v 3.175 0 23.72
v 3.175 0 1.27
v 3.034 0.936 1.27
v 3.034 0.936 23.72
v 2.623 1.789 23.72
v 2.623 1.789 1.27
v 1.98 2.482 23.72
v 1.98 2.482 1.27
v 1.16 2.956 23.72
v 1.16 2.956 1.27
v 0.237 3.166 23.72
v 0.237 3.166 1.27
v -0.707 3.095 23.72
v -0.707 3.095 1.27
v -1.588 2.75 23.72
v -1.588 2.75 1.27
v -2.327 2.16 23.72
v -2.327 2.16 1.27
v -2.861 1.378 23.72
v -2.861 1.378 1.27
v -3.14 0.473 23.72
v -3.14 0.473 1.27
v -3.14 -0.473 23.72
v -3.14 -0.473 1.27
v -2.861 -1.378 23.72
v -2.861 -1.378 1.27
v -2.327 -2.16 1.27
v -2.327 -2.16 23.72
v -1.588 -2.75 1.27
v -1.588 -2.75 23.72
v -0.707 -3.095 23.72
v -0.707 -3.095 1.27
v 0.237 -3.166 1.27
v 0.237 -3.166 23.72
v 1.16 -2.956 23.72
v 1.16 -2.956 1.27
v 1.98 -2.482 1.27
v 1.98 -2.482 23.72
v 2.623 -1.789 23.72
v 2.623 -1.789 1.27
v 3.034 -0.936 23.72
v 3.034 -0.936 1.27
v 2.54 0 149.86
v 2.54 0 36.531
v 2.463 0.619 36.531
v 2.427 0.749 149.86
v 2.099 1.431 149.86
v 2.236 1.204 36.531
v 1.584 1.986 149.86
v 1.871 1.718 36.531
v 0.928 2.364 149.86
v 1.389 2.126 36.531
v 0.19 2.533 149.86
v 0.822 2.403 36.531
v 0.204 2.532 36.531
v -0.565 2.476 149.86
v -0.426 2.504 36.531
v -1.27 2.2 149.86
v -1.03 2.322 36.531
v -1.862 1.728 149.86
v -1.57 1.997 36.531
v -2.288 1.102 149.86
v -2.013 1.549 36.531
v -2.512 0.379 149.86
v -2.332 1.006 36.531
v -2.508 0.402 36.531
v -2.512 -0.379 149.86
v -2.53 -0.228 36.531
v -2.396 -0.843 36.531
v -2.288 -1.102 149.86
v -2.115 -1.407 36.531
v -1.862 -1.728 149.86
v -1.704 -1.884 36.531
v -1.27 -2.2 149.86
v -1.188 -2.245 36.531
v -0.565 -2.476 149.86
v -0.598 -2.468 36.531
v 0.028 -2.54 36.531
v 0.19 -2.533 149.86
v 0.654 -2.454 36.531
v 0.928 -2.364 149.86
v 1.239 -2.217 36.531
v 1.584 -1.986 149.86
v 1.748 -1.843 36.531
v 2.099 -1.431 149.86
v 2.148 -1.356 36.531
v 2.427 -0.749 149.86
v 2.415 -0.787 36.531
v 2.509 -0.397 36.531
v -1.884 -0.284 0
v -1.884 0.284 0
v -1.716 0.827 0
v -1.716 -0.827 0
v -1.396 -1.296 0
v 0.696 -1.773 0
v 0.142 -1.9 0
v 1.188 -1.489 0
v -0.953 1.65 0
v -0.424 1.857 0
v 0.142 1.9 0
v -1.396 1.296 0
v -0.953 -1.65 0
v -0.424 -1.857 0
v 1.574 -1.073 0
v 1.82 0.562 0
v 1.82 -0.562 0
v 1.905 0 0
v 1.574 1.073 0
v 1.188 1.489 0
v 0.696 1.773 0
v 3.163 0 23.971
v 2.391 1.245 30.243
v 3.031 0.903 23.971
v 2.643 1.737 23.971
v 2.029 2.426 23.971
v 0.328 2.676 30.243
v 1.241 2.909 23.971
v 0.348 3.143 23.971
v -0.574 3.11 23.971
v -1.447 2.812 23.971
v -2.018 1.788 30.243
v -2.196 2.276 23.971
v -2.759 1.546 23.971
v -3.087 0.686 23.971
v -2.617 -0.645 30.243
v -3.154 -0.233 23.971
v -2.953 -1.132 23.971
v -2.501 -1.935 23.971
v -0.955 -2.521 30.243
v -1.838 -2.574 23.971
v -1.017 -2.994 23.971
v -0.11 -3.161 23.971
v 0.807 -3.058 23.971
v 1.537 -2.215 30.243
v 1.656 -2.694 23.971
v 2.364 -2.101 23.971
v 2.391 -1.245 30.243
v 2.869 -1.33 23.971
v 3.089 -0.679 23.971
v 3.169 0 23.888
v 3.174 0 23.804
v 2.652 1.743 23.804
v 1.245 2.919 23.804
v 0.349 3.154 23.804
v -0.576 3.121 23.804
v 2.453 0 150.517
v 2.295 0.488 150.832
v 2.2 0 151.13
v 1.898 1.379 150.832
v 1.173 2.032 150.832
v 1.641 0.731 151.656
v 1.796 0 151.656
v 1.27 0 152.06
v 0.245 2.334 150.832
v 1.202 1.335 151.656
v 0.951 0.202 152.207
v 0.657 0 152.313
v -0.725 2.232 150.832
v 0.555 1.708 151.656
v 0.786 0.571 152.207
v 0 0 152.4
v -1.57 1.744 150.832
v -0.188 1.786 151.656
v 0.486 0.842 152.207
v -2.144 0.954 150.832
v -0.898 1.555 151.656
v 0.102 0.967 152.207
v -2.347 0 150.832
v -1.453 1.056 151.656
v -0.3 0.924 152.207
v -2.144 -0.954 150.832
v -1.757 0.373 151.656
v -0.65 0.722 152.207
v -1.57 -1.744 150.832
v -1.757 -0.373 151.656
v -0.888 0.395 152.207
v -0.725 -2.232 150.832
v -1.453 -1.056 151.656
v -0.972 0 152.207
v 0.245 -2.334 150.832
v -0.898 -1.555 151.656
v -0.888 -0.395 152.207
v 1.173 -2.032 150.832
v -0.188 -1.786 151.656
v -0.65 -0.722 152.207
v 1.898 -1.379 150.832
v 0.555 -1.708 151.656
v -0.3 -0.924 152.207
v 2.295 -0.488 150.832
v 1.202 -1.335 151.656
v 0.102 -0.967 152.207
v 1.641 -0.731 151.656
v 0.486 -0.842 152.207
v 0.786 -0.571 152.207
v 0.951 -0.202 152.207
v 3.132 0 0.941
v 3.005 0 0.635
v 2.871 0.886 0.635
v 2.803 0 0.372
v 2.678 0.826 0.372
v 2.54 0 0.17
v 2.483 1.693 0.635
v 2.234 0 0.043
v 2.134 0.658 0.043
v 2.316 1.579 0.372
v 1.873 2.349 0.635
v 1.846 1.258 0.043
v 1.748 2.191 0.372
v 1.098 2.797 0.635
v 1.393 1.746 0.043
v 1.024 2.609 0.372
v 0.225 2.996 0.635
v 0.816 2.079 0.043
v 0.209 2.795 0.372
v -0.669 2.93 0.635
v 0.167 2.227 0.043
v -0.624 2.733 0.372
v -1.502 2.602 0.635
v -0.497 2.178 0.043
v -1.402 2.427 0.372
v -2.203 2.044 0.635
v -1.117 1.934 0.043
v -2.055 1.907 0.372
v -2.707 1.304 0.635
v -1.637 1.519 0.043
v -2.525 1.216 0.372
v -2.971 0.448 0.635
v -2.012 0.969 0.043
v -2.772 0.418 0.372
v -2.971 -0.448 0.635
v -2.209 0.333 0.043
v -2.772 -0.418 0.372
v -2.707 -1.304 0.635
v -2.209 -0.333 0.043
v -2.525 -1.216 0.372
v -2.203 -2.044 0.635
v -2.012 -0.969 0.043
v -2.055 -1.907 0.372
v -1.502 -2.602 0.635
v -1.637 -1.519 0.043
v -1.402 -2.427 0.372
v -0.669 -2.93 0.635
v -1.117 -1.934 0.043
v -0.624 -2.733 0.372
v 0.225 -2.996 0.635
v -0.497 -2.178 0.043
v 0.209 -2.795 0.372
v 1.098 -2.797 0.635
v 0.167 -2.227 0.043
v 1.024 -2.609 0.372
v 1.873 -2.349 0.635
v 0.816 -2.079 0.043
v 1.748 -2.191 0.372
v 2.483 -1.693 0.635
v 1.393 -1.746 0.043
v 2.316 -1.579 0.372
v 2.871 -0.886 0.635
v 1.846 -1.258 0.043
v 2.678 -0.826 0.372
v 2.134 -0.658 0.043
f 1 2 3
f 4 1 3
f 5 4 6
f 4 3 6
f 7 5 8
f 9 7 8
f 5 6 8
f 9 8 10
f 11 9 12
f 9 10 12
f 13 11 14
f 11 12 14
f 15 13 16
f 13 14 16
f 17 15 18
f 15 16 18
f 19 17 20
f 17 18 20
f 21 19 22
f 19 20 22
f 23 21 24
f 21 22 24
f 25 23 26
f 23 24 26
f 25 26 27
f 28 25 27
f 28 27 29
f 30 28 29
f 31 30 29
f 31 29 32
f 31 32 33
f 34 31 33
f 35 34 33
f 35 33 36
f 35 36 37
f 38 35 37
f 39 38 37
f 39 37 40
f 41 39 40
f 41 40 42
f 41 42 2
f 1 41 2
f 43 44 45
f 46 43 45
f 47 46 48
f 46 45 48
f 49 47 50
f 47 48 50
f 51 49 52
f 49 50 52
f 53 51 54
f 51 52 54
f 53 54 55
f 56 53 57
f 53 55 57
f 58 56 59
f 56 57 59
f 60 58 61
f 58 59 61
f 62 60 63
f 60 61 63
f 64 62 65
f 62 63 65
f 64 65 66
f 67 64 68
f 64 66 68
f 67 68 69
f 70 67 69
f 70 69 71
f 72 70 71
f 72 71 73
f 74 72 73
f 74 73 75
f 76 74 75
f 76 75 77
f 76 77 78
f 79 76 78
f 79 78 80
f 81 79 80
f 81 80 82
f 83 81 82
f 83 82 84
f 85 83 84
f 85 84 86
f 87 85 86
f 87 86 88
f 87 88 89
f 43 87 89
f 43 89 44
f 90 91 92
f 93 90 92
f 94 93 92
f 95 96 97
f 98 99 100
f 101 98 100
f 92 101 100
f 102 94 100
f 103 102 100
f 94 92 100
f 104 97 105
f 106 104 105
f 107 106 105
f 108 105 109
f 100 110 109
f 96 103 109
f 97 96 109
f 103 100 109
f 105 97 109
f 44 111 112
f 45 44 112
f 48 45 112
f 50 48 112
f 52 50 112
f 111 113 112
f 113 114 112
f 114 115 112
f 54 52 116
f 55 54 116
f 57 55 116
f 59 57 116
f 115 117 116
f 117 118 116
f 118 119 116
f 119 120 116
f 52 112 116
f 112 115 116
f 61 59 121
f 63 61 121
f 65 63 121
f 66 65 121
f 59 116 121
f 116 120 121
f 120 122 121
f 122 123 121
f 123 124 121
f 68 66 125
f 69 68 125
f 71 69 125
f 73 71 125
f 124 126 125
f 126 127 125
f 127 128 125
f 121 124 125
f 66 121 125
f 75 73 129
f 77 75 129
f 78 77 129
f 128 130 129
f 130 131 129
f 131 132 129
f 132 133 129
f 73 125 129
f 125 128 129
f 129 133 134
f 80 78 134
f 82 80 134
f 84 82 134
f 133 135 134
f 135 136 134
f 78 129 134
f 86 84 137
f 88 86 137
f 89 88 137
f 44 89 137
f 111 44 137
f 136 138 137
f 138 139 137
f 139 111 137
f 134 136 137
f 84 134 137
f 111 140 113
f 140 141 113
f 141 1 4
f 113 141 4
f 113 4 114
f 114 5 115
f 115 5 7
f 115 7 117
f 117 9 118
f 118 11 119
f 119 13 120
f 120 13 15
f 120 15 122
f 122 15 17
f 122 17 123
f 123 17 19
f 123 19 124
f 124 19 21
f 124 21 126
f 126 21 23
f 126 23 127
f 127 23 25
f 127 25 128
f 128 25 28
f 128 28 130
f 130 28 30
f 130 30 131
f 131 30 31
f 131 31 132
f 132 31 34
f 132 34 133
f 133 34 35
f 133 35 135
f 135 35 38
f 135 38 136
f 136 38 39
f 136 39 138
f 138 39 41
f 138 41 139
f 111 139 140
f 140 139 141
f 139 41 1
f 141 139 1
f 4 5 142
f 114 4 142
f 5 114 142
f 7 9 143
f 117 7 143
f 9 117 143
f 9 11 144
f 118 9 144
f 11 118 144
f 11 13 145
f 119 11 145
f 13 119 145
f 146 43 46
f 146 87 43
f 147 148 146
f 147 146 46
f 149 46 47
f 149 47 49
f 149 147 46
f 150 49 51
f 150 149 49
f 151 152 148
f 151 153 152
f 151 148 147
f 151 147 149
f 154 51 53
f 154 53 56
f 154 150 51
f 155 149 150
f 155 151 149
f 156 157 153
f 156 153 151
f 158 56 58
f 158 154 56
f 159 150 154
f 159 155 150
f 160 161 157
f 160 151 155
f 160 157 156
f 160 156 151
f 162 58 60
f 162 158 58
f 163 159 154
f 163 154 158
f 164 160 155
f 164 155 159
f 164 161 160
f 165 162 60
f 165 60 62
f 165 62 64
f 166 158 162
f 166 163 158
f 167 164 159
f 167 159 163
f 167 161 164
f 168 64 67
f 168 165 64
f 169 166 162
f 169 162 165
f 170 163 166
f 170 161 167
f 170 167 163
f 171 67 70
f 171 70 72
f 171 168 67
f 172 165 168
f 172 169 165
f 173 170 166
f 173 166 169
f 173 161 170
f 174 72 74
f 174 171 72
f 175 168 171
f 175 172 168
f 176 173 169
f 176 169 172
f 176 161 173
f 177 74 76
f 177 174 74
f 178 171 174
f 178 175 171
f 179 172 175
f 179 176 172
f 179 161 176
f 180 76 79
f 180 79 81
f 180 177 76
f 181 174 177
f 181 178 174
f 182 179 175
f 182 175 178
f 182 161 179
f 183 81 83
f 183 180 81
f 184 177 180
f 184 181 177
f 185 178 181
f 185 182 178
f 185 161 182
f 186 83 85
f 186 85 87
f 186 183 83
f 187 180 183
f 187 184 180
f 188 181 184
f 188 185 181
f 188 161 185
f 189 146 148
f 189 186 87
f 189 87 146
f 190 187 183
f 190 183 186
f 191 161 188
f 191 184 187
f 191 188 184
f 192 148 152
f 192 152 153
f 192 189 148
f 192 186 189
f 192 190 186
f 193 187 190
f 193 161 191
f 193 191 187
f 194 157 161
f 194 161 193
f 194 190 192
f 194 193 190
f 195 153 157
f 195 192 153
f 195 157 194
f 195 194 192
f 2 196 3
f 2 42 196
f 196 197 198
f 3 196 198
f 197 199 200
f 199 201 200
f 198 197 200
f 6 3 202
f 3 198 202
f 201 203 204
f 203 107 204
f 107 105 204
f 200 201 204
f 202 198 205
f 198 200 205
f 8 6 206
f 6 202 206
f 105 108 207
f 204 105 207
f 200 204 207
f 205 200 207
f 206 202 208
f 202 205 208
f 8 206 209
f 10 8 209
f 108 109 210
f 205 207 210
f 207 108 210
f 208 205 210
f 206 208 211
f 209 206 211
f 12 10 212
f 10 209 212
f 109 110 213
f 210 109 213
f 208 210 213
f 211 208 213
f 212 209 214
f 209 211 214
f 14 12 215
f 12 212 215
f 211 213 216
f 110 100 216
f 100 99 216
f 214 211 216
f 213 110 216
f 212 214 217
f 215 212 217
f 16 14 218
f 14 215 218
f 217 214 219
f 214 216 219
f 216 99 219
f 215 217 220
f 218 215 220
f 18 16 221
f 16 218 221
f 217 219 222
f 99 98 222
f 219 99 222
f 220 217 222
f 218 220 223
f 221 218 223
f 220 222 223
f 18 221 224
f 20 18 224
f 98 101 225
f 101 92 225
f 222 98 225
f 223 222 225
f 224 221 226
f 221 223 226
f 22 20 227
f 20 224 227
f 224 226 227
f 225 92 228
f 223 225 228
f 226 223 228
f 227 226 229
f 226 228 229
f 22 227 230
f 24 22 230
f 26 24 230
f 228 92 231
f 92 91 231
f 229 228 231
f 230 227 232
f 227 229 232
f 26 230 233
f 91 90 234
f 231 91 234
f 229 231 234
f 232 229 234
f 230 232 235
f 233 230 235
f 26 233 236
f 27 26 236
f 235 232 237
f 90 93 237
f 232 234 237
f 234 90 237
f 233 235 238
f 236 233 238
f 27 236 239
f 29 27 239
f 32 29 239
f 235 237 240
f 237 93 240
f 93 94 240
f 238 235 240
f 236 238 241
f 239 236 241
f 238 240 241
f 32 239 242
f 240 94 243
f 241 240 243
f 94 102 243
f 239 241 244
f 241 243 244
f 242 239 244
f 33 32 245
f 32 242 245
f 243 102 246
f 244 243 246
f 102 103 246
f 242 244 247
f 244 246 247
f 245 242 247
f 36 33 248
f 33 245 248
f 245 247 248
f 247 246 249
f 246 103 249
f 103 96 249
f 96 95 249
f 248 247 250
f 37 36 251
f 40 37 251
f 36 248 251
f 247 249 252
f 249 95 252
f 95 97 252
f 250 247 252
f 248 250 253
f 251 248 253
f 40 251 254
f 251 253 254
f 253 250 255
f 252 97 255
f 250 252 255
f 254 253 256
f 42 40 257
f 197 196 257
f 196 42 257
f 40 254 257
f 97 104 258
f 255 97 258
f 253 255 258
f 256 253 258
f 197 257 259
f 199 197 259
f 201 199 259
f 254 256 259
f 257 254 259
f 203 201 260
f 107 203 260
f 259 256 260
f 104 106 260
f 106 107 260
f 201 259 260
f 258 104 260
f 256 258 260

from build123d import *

# Parameters (mm, degrees)
F0_R     = 2.54
F1_DEPTH = 152.4
F2_R     = 2.54
F0_R_2   = 3.175
F3_DEPTH = 25.4
F5_R     = 127
F6_R     = 1.27


# Not quite as in the source:
# - a fillet or chamfer that OpenCascade refuses, or shapes differently, is made with other operations: its cross-section is extruded or revolved along the edge and cut away or added


with BuildPart() as f1:
    # F0 (on Top) → F1 (new body)
    with BuildSketch(Plane.XY):
        Circle(F0_R)
    extrude(amount=F1_DEPTH)

    # F2
    f2_edges = [f1.edges().sort_by_distance(p)[0] for p in [
        (-2.54, 0, 152.4),
    ]]
    fillet(f2_edges, radius=F2_R)

    # F0 (on Top) → F3 (join)
    with BuildSketch(Plane.XY):
        Circle(F0_R_2)
        Circle(F0_R, mode=Mode.SUBTRACT)
    extrude(amount=F3_DEPTH)

    # F4: fillet of radius 2.54 on 1 edges, made by hand

    # F4_s1 → F4_t2 (revolve, cut)
    with BuildSketch(Plane.XZ):
        with BuildLine():
            ThreePointArc((2.54, 25.4), (3.0109524406, 24.6179735296), (3.175, 23.7199479175))
            Line((3.175, 23.7199479175), (3.175, 25.4))
            Line((3.175, 25.4), (2.54, 25.4))
        make_face()
    revolve(axis=Axis((0, 0, 25.4), (0, 0, 1)), mode=Mode.SUBTRACT)

    # F5
    f5_edges = [f1.edges().sort_by_distance(p)[0] for p in [
        (-2.54, 0, 25.4),
    ]]
    fillet(f5_edges, radius=F5_R)

    # F6
    f6_edges = [f1.edges().sort_by_distance(p)[0] for p in [
        (-3.175, 0, 0),
    ]]
    fillet(f6_edges, radius=F6_R)


solid = f1.part
